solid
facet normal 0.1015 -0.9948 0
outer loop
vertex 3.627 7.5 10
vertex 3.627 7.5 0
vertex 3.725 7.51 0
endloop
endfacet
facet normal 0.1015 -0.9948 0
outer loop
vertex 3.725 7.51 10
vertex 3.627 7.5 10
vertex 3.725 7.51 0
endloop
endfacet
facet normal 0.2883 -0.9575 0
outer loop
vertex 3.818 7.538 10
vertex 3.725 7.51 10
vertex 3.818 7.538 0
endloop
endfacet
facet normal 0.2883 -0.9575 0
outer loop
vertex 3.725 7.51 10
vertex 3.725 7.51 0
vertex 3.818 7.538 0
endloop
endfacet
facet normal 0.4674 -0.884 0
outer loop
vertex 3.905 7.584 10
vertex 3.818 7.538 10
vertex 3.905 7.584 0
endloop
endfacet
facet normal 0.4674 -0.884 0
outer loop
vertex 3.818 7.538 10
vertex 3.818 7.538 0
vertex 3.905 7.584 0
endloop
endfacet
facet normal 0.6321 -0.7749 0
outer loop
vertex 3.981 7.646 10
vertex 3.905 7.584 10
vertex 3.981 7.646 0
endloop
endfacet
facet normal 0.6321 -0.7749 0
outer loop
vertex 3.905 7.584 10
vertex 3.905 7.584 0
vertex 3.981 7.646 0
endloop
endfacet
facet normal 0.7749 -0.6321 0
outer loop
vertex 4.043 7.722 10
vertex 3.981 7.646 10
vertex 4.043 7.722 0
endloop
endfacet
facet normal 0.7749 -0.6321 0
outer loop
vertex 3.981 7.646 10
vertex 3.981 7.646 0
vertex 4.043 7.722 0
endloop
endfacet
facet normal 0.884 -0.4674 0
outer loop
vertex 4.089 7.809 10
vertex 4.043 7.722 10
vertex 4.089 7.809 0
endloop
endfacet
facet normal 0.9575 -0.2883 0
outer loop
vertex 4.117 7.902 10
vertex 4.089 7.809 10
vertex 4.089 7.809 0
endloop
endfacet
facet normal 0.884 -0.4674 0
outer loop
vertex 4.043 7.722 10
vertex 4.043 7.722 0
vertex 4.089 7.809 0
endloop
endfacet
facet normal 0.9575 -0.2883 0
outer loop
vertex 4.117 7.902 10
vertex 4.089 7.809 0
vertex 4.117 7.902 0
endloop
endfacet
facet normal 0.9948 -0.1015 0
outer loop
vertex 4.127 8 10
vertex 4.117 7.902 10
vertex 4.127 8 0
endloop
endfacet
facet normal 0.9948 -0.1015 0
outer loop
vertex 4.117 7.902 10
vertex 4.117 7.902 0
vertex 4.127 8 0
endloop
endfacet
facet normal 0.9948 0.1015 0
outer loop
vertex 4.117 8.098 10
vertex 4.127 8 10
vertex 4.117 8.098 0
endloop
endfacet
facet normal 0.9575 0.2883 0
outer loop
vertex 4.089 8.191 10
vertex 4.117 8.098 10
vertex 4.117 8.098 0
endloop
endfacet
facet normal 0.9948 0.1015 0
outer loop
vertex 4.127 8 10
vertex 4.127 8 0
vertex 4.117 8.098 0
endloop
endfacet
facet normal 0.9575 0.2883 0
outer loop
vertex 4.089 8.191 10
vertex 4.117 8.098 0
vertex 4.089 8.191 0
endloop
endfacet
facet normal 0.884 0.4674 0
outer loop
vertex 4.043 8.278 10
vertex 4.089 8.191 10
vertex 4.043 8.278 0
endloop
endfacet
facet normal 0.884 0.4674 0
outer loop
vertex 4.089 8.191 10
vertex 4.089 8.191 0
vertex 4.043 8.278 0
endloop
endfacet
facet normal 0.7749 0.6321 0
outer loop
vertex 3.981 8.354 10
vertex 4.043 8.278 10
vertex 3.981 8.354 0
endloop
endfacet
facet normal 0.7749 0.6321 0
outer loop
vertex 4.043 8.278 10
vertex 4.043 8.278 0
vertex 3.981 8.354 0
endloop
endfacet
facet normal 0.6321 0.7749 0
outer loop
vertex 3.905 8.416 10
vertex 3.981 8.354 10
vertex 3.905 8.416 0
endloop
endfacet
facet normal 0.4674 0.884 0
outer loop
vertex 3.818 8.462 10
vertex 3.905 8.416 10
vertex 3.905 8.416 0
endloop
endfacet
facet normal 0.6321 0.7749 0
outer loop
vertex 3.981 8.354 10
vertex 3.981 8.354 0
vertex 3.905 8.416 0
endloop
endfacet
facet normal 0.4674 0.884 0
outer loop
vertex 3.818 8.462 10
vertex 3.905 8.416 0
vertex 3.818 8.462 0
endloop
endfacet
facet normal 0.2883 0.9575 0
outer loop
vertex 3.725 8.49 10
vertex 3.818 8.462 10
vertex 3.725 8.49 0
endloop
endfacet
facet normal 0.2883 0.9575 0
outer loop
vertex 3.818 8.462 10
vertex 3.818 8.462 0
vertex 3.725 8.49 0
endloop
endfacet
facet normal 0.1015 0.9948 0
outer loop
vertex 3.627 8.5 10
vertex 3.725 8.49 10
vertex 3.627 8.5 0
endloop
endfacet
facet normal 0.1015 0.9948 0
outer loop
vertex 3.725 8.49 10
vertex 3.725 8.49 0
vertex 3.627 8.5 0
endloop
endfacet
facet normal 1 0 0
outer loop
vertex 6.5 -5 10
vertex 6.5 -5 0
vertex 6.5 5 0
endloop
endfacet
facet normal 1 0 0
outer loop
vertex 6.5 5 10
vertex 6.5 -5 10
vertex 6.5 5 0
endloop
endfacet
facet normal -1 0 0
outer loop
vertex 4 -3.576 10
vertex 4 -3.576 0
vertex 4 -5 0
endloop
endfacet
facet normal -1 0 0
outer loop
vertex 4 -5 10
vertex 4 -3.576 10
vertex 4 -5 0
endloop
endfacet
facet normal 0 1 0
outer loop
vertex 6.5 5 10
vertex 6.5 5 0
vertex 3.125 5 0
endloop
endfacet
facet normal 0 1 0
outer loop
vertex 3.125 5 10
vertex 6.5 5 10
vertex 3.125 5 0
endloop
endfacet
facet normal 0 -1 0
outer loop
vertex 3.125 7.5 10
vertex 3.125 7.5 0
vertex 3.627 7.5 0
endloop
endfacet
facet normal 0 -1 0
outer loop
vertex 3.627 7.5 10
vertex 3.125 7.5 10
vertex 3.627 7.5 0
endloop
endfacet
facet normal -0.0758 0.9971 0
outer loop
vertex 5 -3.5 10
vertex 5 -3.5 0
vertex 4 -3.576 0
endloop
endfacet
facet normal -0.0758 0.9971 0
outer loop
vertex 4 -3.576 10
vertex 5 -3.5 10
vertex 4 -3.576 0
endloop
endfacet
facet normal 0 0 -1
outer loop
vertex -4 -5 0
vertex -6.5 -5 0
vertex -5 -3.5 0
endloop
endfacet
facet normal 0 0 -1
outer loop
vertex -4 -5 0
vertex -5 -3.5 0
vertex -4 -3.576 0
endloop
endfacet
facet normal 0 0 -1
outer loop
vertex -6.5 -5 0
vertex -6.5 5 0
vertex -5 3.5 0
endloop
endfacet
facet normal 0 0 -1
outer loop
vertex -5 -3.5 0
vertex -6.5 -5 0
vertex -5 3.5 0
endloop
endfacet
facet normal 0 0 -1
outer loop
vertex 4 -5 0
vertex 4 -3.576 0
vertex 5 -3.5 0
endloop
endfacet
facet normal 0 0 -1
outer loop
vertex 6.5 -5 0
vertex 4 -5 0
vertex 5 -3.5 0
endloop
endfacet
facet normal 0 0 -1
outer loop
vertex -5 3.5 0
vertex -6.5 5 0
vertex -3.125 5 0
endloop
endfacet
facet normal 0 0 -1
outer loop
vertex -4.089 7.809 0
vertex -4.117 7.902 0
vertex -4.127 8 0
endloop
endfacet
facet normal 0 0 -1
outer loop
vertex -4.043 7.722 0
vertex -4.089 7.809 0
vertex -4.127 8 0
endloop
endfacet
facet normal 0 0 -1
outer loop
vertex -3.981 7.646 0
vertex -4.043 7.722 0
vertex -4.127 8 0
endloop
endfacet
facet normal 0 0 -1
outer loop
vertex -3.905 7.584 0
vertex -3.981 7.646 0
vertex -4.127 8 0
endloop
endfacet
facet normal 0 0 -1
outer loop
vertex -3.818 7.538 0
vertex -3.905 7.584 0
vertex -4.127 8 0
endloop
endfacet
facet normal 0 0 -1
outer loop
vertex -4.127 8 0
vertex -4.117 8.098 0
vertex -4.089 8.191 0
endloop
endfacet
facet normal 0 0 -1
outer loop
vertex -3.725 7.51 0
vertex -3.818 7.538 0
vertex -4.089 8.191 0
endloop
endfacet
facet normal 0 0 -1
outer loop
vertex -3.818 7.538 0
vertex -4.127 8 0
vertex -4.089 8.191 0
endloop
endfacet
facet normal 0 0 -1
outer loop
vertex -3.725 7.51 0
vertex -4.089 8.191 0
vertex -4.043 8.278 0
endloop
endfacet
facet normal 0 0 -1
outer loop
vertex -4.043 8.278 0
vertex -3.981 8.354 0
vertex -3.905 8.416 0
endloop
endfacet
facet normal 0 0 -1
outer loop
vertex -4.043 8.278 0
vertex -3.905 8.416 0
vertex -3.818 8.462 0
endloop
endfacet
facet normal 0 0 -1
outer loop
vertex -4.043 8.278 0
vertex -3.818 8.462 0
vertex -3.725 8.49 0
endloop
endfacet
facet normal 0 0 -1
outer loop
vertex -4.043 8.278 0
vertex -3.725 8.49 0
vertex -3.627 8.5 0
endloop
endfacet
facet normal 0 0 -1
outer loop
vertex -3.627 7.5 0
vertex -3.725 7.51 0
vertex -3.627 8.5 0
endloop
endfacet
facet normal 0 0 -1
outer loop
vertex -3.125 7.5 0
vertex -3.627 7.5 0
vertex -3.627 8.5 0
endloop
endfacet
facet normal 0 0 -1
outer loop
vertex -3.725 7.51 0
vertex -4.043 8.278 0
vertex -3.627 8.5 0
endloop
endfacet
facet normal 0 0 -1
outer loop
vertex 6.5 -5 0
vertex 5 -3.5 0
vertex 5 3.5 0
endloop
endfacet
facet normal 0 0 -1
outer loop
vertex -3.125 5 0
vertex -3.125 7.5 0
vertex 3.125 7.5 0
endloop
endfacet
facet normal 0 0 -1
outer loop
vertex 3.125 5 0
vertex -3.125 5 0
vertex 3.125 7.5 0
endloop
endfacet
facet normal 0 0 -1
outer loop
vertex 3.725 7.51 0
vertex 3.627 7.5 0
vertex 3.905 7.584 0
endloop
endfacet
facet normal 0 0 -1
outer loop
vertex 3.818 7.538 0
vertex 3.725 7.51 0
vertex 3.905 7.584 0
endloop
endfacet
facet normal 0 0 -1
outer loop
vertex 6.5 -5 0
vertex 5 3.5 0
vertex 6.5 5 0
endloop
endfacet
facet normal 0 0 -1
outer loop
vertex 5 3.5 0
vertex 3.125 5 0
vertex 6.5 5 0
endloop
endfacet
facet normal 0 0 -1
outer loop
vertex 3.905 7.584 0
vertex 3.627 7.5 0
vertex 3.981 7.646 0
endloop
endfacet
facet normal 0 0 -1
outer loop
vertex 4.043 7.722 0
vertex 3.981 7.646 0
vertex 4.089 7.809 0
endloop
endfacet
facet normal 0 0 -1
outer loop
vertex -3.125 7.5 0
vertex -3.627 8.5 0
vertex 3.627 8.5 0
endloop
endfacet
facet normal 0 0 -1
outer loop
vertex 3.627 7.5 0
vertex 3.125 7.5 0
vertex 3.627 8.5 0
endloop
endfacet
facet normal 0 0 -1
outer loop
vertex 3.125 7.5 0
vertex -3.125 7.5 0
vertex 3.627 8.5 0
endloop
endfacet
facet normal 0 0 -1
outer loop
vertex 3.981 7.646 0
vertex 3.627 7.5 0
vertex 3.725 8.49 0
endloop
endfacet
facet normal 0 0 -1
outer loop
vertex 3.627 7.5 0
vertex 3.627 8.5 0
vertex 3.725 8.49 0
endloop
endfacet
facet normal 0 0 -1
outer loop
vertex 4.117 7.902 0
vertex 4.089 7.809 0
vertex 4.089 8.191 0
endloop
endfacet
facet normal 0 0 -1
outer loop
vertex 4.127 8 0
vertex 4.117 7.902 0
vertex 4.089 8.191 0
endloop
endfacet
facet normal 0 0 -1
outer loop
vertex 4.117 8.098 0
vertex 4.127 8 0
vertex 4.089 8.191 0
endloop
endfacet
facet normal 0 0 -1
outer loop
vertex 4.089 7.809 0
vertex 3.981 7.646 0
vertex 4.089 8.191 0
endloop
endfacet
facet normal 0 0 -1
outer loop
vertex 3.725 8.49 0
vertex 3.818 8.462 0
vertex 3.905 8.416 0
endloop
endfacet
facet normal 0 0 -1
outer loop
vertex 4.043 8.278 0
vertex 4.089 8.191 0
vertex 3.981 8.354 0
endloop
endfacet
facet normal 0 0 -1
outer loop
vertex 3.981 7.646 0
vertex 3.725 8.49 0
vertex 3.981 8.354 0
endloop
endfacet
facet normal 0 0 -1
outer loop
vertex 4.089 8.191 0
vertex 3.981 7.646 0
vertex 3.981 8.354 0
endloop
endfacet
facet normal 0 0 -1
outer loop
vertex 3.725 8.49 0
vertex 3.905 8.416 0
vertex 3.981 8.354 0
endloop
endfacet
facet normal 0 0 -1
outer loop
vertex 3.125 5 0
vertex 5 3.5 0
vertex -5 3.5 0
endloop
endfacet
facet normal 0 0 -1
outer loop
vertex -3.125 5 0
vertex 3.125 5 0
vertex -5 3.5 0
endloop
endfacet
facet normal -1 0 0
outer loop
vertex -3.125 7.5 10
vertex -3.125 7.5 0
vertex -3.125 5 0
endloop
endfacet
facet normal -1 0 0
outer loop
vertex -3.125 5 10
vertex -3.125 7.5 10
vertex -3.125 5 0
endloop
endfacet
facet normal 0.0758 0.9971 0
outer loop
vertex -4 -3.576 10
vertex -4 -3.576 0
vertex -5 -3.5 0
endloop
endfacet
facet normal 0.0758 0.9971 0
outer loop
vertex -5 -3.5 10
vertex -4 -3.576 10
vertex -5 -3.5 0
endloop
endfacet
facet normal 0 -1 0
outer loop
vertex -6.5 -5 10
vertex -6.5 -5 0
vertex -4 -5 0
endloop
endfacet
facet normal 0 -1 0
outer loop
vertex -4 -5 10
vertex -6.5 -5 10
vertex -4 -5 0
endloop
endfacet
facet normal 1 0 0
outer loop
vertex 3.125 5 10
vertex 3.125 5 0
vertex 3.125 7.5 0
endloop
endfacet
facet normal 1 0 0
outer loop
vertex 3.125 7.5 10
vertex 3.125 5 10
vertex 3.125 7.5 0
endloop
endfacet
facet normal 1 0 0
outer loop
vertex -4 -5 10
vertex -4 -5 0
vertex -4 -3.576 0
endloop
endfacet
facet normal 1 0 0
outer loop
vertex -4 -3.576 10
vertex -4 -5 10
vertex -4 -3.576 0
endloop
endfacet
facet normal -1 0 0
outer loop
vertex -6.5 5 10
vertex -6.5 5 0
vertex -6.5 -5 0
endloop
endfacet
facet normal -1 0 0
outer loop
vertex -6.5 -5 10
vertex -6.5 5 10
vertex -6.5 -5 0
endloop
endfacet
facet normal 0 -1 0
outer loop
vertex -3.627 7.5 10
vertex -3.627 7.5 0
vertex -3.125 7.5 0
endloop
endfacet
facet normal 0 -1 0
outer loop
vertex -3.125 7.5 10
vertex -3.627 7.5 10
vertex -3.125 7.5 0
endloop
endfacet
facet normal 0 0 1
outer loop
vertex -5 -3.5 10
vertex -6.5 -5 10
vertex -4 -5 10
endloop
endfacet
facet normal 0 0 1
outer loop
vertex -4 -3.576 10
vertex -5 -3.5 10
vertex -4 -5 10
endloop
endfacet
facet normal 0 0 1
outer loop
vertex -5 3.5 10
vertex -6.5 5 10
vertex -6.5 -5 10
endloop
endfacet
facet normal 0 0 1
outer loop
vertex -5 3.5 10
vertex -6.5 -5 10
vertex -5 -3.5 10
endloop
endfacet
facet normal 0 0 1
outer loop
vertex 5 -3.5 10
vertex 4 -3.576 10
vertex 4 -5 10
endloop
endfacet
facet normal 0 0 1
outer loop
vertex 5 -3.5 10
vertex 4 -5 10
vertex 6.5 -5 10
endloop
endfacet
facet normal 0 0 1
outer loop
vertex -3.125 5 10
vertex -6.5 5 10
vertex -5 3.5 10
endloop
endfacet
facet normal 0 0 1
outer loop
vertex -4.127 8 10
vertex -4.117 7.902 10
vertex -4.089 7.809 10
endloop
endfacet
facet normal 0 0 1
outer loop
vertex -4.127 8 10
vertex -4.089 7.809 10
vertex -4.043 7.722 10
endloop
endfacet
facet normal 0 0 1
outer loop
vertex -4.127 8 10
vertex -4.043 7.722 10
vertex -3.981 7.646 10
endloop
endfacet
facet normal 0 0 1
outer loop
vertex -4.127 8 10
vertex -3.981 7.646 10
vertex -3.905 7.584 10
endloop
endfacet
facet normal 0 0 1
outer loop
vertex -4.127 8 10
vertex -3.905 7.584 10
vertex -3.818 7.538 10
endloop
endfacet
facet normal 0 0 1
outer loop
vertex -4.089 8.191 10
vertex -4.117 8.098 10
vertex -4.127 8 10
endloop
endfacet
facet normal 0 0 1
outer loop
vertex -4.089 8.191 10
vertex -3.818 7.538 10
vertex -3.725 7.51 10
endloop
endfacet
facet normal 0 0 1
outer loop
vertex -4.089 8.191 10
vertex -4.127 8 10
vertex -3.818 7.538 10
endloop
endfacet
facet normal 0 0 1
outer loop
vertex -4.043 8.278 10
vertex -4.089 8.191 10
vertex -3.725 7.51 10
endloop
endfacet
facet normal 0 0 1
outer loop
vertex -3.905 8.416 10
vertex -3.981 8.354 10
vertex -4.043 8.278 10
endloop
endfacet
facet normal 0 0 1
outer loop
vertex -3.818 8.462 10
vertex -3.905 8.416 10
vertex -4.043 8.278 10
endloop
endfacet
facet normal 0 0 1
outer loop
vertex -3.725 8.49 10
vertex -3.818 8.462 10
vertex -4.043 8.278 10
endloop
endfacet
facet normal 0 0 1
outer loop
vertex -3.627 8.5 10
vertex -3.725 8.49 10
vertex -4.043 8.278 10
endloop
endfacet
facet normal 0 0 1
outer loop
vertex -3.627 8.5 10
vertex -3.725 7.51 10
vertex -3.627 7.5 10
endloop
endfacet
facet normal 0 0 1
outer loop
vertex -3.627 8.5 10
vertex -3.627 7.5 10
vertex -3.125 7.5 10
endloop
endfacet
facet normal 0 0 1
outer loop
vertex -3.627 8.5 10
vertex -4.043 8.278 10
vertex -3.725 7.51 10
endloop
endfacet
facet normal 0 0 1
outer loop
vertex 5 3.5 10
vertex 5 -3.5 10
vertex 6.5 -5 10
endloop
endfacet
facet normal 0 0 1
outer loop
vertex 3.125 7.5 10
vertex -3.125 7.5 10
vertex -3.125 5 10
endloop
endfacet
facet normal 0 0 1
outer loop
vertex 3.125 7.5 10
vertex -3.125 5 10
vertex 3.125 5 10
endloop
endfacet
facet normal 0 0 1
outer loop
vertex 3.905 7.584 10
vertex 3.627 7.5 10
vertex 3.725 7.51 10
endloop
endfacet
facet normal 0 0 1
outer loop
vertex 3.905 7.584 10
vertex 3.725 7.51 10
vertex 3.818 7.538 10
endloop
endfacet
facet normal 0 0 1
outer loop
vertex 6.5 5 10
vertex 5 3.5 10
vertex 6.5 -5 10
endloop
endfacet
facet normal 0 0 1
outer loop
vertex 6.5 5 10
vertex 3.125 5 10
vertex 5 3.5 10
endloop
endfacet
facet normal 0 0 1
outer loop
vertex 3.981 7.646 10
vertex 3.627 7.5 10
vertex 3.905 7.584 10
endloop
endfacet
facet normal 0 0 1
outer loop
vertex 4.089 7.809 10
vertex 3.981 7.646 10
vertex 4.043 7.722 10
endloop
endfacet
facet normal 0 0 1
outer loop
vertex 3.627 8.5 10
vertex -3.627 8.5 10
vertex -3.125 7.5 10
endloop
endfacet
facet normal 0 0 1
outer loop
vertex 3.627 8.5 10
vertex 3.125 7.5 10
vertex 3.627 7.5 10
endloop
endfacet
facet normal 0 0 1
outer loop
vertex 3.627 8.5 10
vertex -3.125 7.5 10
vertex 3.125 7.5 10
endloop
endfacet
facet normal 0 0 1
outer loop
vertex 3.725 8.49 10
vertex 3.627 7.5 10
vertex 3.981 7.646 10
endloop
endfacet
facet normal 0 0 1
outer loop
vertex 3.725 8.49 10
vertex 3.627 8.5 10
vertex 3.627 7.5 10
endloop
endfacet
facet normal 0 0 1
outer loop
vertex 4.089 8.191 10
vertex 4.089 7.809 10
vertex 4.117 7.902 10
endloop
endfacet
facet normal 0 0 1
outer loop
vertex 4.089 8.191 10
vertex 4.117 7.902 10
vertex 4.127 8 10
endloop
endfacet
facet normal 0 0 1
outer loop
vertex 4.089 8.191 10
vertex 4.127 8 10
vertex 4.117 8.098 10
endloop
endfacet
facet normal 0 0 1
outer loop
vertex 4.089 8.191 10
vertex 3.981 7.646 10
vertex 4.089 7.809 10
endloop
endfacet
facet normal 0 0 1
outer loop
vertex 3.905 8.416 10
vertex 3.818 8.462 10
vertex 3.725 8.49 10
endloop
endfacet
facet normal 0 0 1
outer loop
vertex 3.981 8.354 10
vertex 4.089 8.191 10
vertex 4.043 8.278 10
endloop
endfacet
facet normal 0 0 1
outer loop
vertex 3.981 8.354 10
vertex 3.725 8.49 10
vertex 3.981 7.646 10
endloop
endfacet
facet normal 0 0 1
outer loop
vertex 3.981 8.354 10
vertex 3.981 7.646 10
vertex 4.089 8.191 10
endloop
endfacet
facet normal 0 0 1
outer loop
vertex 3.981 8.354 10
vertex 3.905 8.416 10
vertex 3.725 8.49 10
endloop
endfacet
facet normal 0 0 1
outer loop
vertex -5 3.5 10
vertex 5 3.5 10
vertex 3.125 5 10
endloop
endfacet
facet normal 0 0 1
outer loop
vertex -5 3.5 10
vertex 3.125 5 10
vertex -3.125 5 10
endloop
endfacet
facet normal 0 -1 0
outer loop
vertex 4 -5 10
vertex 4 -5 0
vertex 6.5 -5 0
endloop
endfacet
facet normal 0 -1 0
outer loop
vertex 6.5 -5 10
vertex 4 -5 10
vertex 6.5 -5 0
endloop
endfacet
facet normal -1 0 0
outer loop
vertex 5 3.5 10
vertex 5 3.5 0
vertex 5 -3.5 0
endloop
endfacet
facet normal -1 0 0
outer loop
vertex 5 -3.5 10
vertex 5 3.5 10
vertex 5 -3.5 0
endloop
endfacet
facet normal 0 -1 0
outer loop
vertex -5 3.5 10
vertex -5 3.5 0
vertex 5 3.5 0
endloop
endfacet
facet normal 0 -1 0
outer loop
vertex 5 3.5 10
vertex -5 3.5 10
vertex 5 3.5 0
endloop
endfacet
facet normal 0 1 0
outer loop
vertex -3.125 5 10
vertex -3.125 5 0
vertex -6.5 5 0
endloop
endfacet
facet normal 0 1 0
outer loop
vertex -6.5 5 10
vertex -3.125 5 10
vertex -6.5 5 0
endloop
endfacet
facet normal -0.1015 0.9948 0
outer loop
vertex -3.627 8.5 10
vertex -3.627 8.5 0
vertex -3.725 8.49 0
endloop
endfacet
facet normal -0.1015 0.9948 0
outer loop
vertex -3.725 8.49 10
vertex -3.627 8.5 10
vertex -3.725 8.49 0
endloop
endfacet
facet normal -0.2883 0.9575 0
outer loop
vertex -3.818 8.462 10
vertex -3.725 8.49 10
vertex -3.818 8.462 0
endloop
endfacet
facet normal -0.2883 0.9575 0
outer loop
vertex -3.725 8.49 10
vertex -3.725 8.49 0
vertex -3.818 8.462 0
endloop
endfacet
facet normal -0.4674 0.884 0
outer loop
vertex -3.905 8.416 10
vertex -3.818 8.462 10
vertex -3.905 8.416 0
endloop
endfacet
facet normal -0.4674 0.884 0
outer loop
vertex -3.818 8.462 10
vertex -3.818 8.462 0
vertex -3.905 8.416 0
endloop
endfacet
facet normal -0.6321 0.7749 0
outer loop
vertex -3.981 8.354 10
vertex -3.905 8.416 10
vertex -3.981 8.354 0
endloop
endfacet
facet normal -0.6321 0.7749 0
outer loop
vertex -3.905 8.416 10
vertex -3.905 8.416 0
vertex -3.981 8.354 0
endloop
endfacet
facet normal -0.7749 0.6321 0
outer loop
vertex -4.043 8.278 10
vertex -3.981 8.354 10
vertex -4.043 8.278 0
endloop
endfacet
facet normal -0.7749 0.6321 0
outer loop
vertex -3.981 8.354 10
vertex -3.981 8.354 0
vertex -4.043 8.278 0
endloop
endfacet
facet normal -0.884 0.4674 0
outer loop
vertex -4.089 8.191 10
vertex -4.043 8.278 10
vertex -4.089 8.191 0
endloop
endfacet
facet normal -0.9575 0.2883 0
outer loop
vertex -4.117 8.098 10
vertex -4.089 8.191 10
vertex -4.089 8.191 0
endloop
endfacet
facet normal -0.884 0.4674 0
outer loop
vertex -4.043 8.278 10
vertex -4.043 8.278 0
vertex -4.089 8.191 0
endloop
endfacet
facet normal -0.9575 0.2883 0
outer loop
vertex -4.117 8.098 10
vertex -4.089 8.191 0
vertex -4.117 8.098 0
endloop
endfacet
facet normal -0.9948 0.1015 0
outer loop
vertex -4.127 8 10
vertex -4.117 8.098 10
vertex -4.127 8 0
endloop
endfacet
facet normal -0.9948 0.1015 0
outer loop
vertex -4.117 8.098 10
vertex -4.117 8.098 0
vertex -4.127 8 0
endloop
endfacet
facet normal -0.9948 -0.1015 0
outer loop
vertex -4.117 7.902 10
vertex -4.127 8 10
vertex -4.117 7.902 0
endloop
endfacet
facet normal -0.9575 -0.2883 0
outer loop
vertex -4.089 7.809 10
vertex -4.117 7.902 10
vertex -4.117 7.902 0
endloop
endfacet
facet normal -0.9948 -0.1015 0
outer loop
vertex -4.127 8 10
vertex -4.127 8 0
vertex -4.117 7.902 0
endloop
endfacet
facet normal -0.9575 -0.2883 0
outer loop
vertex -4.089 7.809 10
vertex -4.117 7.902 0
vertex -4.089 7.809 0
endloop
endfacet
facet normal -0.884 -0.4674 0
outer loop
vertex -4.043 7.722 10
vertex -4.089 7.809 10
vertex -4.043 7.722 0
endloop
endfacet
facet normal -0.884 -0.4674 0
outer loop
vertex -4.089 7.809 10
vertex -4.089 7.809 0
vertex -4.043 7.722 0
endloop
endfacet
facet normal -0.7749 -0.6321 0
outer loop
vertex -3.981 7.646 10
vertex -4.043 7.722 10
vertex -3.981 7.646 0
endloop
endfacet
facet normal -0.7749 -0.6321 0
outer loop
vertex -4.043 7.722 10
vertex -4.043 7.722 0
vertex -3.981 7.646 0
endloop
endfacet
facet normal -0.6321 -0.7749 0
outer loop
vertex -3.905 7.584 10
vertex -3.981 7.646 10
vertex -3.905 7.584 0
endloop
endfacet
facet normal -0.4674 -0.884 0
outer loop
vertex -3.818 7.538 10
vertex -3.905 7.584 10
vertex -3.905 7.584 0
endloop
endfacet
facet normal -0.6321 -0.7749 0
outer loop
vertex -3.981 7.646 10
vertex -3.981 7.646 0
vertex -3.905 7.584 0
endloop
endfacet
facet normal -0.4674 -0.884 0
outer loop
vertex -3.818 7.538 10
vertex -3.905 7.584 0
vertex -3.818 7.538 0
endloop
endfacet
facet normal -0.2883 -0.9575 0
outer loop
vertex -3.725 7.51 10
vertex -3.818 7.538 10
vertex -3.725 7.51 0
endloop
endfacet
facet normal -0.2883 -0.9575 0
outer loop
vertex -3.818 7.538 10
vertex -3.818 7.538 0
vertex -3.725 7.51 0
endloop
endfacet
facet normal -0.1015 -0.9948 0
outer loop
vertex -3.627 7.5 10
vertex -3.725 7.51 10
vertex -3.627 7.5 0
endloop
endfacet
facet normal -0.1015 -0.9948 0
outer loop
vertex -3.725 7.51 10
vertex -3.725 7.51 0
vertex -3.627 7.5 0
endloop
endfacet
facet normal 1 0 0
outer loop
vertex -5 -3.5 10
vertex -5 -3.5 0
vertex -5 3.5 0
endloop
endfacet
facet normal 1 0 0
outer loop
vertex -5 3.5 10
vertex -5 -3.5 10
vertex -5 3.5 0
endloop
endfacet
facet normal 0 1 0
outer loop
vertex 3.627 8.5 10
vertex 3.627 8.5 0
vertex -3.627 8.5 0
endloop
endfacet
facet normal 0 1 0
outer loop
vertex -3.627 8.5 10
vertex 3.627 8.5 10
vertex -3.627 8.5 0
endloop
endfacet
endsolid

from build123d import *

# Parameters (mm, degrees)
F1_DEPTH = 10


with BuildPart() as f1:
    # F0 (on Top) → F1 (new body)
    with BuildSketch(Plane.XY):
        with BuildLine():
            Line((-6.5, -5), (-4, -5))
            Line((-4, -5), (-4, -3.576375))
            Line((-4, -3.576375), (-5, -3.5))
            Line((-5, -3.5), (-5, 3.5))
            Line((-5, 3.5), (5, 3.5))
            Line((5, 3.5), (5, -3.5))
            Line((5, -3.5), (4, -3.576375))
            Line((4, -3.576375), (4, -5))
            Line((4, -5), (6.5, -5))
            Line((6.5, -5), (6.5, 5))
            Line((6.5, 5), (3.125, 5))
            Line((3.125, 5), (3.125, 7.5))
            Line((3.125, 7.5), (3.627, 7.5))
            ThreePointArc((3.627, 7.5), (4.127, 8), (3.627, 8.5))
            Line((3.627, 8.5), (-3.627, 8.5))
            ThreePointArc((-3.627, 8.5), (-4.127, 8), (-3.627, 7.5))
            Line((-3.627, 7.5), (-3.125, 7.5))
            Line((-3.125, 7.5), (-3.125, 5))
            Line((-3.125, 5), (-6.5, 5))
            Line((-6.5, 5), (-6.5, -5))
        make_face()
    extrude(amount=F1_DEPTH)


solid = f1.part
